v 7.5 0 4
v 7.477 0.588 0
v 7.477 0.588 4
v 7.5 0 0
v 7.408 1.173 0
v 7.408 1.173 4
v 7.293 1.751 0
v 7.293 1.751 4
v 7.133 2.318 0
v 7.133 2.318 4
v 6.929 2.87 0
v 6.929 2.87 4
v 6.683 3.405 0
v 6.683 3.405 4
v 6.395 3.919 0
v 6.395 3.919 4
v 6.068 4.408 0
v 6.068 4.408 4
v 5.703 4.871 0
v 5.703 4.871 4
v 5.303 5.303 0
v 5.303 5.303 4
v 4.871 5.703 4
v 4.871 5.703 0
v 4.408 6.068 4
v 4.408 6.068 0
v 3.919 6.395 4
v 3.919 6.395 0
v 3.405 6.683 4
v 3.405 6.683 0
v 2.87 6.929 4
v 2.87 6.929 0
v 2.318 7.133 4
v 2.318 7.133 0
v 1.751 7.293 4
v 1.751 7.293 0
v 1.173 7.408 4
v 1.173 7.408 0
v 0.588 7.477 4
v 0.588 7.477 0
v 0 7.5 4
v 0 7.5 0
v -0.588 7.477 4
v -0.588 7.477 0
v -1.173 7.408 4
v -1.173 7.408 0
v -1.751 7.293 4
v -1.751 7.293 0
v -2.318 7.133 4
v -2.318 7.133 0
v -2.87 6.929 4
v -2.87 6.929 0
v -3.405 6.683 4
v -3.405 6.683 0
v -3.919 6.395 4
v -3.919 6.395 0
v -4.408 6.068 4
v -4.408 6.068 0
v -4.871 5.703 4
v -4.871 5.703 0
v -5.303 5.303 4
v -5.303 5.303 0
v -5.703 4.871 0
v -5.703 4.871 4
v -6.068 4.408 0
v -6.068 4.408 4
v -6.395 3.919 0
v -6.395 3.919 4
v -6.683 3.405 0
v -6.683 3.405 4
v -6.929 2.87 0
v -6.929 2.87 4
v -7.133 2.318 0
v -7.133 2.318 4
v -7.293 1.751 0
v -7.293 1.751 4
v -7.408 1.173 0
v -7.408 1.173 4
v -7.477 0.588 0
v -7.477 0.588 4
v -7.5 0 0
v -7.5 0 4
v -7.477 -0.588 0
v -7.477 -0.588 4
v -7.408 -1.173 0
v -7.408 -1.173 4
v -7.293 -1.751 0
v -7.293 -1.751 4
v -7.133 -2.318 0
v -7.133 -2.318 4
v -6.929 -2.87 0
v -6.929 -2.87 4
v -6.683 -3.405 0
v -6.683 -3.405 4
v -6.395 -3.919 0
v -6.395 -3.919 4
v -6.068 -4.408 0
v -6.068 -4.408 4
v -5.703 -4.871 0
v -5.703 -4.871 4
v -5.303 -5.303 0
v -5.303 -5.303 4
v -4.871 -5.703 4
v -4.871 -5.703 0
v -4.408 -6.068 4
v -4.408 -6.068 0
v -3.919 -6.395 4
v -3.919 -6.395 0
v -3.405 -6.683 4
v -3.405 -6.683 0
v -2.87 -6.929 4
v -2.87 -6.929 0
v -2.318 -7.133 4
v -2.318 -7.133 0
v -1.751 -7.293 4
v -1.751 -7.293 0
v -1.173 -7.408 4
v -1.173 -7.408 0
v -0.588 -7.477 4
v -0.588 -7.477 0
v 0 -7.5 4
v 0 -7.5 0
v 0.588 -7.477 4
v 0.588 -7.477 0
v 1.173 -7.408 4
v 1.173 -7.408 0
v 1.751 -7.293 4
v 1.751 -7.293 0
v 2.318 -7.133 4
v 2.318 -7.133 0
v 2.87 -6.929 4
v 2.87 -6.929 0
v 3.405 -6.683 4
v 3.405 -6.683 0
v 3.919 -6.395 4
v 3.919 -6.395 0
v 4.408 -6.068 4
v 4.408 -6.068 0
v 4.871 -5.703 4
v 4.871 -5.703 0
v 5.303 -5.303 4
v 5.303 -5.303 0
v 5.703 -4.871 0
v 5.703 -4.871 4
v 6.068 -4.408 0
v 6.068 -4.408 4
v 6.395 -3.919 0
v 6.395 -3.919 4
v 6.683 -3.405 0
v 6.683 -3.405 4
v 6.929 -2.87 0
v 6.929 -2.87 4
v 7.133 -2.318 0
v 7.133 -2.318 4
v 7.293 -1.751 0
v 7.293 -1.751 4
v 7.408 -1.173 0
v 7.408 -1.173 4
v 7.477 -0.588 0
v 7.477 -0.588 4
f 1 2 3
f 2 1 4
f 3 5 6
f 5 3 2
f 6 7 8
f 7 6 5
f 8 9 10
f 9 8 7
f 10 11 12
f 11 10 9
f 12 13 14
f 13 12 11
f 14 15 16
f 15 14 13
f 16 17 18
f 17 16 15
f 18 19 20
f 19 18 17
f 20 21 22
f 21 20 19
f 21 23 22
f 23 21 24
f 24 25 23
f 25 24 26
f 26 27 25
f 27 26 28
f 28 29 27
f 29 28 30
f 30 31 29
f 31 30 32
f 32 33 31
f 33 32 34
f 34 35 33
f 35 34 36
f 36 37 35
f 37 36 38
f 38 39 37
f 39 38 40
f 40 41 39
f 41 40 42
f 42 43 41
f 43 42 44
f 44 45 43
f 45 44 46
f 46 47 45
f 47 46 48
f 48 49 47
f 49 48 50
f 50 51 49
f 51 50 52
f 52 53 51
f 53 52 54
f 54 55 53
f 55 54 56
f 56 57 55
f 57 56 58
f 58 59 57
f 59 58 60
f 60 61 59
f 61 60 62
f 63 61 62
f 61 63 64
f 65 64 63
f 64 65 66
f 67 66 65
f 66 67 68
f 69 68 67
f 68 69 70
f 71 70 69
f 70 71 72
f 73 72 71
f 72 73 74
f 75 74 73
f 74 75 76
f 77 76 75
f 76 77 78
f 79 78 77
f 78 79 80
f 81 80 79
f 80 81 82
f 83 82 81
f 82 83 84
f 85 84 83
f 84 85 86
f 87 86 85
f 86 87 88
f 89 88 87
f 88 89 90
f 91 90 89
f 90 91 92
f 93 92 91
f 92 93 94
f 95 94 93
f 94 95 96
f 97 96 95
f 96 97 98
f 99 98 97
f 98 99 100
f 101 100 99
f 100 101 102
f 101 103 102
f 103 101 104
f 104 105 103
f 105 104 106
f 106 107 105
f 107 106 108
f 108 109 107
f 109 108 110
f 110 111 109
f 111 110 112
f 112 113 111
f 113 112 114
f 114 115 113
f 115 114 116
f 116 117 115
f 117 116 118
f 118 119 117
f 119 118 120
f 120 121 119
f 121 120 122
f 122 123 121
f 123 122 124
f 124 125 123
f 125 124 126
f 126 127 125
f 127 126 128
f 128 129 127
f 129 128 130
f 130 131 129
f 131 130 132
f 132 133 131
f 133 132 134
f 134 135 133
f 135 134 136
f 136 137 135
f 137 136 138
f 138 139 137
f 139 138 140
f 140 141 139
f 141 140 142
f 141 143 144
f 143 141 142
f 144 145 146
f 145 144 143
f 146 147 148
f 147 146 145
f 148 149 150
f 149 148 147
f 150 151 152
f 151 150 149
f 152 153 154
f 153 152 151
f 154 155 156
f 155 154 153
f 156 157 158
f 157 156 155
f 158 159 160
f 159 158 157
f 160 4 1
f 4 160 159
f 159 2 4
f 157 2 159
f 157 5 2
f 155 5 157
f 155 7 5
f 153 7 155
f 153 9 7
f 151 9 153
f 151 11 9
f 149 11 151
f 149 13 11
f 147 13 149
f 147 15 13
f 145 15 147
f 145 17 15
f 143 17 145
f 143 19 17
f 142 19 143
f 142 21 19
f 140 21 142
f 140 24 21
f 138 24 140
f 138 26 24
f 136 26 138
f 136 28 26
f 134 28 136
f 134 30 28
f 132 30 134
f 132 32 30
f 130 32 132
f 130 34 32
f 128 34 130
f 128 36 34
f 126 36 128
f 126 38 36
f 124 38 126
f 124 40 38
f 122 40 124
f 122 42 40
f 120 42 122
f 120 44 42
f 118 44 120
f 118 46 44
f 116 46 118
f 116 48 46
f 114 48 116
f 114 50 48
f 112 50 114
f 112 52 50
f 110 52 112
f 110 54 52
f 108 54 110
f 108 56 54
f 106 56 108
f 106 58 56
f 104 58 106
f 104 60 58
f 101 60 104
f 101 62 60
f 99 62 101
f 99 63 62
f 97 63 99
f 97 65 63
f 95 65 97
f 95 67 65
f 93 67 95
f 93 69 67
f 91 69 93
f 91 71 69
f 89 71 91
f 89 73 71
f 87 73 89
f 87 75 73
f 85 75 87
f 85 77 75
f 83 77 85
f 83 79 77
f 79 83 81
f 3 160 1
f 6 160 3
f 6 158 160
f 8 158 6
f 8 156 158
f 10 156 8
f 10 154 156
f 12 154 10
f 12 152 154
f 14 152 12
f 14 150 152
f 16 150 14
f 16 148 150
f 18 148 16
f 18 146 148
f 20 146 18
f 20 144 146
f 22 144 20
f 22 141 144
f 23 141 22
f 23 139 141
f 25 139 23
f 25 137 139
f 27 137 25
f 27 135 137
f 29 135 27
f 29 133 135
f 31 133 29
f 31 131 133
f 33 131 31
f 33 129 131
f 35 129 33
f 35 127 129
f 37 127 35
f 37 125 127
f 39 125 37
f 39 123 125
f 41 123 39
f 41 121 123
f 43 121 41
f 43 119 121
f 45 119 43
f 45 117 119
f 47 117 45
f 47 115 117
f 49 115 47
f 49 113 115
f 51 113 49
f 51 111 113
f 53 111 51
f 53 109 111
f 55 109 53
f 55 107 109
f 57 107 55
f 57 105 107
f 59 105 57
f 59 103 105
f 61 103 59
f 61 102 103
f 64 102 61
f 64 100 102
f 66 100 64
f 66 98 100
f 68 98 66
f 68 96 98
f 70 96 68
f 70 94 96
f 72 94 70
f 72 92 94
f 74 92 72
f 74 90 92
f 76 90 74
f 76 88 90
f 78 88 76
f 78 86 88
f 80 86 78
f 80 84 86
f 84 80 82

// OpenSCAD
// params
diameter=15;
depth=4;
above_ground=true; 

// calculations
zdisplace = above_ground ? depth/2 : 0-(depth/2);
radius = diameter/2;

translate([0,0, zdisplace])  
  cylinder(h=depth,r=radius, $fn = 80, center=true);
